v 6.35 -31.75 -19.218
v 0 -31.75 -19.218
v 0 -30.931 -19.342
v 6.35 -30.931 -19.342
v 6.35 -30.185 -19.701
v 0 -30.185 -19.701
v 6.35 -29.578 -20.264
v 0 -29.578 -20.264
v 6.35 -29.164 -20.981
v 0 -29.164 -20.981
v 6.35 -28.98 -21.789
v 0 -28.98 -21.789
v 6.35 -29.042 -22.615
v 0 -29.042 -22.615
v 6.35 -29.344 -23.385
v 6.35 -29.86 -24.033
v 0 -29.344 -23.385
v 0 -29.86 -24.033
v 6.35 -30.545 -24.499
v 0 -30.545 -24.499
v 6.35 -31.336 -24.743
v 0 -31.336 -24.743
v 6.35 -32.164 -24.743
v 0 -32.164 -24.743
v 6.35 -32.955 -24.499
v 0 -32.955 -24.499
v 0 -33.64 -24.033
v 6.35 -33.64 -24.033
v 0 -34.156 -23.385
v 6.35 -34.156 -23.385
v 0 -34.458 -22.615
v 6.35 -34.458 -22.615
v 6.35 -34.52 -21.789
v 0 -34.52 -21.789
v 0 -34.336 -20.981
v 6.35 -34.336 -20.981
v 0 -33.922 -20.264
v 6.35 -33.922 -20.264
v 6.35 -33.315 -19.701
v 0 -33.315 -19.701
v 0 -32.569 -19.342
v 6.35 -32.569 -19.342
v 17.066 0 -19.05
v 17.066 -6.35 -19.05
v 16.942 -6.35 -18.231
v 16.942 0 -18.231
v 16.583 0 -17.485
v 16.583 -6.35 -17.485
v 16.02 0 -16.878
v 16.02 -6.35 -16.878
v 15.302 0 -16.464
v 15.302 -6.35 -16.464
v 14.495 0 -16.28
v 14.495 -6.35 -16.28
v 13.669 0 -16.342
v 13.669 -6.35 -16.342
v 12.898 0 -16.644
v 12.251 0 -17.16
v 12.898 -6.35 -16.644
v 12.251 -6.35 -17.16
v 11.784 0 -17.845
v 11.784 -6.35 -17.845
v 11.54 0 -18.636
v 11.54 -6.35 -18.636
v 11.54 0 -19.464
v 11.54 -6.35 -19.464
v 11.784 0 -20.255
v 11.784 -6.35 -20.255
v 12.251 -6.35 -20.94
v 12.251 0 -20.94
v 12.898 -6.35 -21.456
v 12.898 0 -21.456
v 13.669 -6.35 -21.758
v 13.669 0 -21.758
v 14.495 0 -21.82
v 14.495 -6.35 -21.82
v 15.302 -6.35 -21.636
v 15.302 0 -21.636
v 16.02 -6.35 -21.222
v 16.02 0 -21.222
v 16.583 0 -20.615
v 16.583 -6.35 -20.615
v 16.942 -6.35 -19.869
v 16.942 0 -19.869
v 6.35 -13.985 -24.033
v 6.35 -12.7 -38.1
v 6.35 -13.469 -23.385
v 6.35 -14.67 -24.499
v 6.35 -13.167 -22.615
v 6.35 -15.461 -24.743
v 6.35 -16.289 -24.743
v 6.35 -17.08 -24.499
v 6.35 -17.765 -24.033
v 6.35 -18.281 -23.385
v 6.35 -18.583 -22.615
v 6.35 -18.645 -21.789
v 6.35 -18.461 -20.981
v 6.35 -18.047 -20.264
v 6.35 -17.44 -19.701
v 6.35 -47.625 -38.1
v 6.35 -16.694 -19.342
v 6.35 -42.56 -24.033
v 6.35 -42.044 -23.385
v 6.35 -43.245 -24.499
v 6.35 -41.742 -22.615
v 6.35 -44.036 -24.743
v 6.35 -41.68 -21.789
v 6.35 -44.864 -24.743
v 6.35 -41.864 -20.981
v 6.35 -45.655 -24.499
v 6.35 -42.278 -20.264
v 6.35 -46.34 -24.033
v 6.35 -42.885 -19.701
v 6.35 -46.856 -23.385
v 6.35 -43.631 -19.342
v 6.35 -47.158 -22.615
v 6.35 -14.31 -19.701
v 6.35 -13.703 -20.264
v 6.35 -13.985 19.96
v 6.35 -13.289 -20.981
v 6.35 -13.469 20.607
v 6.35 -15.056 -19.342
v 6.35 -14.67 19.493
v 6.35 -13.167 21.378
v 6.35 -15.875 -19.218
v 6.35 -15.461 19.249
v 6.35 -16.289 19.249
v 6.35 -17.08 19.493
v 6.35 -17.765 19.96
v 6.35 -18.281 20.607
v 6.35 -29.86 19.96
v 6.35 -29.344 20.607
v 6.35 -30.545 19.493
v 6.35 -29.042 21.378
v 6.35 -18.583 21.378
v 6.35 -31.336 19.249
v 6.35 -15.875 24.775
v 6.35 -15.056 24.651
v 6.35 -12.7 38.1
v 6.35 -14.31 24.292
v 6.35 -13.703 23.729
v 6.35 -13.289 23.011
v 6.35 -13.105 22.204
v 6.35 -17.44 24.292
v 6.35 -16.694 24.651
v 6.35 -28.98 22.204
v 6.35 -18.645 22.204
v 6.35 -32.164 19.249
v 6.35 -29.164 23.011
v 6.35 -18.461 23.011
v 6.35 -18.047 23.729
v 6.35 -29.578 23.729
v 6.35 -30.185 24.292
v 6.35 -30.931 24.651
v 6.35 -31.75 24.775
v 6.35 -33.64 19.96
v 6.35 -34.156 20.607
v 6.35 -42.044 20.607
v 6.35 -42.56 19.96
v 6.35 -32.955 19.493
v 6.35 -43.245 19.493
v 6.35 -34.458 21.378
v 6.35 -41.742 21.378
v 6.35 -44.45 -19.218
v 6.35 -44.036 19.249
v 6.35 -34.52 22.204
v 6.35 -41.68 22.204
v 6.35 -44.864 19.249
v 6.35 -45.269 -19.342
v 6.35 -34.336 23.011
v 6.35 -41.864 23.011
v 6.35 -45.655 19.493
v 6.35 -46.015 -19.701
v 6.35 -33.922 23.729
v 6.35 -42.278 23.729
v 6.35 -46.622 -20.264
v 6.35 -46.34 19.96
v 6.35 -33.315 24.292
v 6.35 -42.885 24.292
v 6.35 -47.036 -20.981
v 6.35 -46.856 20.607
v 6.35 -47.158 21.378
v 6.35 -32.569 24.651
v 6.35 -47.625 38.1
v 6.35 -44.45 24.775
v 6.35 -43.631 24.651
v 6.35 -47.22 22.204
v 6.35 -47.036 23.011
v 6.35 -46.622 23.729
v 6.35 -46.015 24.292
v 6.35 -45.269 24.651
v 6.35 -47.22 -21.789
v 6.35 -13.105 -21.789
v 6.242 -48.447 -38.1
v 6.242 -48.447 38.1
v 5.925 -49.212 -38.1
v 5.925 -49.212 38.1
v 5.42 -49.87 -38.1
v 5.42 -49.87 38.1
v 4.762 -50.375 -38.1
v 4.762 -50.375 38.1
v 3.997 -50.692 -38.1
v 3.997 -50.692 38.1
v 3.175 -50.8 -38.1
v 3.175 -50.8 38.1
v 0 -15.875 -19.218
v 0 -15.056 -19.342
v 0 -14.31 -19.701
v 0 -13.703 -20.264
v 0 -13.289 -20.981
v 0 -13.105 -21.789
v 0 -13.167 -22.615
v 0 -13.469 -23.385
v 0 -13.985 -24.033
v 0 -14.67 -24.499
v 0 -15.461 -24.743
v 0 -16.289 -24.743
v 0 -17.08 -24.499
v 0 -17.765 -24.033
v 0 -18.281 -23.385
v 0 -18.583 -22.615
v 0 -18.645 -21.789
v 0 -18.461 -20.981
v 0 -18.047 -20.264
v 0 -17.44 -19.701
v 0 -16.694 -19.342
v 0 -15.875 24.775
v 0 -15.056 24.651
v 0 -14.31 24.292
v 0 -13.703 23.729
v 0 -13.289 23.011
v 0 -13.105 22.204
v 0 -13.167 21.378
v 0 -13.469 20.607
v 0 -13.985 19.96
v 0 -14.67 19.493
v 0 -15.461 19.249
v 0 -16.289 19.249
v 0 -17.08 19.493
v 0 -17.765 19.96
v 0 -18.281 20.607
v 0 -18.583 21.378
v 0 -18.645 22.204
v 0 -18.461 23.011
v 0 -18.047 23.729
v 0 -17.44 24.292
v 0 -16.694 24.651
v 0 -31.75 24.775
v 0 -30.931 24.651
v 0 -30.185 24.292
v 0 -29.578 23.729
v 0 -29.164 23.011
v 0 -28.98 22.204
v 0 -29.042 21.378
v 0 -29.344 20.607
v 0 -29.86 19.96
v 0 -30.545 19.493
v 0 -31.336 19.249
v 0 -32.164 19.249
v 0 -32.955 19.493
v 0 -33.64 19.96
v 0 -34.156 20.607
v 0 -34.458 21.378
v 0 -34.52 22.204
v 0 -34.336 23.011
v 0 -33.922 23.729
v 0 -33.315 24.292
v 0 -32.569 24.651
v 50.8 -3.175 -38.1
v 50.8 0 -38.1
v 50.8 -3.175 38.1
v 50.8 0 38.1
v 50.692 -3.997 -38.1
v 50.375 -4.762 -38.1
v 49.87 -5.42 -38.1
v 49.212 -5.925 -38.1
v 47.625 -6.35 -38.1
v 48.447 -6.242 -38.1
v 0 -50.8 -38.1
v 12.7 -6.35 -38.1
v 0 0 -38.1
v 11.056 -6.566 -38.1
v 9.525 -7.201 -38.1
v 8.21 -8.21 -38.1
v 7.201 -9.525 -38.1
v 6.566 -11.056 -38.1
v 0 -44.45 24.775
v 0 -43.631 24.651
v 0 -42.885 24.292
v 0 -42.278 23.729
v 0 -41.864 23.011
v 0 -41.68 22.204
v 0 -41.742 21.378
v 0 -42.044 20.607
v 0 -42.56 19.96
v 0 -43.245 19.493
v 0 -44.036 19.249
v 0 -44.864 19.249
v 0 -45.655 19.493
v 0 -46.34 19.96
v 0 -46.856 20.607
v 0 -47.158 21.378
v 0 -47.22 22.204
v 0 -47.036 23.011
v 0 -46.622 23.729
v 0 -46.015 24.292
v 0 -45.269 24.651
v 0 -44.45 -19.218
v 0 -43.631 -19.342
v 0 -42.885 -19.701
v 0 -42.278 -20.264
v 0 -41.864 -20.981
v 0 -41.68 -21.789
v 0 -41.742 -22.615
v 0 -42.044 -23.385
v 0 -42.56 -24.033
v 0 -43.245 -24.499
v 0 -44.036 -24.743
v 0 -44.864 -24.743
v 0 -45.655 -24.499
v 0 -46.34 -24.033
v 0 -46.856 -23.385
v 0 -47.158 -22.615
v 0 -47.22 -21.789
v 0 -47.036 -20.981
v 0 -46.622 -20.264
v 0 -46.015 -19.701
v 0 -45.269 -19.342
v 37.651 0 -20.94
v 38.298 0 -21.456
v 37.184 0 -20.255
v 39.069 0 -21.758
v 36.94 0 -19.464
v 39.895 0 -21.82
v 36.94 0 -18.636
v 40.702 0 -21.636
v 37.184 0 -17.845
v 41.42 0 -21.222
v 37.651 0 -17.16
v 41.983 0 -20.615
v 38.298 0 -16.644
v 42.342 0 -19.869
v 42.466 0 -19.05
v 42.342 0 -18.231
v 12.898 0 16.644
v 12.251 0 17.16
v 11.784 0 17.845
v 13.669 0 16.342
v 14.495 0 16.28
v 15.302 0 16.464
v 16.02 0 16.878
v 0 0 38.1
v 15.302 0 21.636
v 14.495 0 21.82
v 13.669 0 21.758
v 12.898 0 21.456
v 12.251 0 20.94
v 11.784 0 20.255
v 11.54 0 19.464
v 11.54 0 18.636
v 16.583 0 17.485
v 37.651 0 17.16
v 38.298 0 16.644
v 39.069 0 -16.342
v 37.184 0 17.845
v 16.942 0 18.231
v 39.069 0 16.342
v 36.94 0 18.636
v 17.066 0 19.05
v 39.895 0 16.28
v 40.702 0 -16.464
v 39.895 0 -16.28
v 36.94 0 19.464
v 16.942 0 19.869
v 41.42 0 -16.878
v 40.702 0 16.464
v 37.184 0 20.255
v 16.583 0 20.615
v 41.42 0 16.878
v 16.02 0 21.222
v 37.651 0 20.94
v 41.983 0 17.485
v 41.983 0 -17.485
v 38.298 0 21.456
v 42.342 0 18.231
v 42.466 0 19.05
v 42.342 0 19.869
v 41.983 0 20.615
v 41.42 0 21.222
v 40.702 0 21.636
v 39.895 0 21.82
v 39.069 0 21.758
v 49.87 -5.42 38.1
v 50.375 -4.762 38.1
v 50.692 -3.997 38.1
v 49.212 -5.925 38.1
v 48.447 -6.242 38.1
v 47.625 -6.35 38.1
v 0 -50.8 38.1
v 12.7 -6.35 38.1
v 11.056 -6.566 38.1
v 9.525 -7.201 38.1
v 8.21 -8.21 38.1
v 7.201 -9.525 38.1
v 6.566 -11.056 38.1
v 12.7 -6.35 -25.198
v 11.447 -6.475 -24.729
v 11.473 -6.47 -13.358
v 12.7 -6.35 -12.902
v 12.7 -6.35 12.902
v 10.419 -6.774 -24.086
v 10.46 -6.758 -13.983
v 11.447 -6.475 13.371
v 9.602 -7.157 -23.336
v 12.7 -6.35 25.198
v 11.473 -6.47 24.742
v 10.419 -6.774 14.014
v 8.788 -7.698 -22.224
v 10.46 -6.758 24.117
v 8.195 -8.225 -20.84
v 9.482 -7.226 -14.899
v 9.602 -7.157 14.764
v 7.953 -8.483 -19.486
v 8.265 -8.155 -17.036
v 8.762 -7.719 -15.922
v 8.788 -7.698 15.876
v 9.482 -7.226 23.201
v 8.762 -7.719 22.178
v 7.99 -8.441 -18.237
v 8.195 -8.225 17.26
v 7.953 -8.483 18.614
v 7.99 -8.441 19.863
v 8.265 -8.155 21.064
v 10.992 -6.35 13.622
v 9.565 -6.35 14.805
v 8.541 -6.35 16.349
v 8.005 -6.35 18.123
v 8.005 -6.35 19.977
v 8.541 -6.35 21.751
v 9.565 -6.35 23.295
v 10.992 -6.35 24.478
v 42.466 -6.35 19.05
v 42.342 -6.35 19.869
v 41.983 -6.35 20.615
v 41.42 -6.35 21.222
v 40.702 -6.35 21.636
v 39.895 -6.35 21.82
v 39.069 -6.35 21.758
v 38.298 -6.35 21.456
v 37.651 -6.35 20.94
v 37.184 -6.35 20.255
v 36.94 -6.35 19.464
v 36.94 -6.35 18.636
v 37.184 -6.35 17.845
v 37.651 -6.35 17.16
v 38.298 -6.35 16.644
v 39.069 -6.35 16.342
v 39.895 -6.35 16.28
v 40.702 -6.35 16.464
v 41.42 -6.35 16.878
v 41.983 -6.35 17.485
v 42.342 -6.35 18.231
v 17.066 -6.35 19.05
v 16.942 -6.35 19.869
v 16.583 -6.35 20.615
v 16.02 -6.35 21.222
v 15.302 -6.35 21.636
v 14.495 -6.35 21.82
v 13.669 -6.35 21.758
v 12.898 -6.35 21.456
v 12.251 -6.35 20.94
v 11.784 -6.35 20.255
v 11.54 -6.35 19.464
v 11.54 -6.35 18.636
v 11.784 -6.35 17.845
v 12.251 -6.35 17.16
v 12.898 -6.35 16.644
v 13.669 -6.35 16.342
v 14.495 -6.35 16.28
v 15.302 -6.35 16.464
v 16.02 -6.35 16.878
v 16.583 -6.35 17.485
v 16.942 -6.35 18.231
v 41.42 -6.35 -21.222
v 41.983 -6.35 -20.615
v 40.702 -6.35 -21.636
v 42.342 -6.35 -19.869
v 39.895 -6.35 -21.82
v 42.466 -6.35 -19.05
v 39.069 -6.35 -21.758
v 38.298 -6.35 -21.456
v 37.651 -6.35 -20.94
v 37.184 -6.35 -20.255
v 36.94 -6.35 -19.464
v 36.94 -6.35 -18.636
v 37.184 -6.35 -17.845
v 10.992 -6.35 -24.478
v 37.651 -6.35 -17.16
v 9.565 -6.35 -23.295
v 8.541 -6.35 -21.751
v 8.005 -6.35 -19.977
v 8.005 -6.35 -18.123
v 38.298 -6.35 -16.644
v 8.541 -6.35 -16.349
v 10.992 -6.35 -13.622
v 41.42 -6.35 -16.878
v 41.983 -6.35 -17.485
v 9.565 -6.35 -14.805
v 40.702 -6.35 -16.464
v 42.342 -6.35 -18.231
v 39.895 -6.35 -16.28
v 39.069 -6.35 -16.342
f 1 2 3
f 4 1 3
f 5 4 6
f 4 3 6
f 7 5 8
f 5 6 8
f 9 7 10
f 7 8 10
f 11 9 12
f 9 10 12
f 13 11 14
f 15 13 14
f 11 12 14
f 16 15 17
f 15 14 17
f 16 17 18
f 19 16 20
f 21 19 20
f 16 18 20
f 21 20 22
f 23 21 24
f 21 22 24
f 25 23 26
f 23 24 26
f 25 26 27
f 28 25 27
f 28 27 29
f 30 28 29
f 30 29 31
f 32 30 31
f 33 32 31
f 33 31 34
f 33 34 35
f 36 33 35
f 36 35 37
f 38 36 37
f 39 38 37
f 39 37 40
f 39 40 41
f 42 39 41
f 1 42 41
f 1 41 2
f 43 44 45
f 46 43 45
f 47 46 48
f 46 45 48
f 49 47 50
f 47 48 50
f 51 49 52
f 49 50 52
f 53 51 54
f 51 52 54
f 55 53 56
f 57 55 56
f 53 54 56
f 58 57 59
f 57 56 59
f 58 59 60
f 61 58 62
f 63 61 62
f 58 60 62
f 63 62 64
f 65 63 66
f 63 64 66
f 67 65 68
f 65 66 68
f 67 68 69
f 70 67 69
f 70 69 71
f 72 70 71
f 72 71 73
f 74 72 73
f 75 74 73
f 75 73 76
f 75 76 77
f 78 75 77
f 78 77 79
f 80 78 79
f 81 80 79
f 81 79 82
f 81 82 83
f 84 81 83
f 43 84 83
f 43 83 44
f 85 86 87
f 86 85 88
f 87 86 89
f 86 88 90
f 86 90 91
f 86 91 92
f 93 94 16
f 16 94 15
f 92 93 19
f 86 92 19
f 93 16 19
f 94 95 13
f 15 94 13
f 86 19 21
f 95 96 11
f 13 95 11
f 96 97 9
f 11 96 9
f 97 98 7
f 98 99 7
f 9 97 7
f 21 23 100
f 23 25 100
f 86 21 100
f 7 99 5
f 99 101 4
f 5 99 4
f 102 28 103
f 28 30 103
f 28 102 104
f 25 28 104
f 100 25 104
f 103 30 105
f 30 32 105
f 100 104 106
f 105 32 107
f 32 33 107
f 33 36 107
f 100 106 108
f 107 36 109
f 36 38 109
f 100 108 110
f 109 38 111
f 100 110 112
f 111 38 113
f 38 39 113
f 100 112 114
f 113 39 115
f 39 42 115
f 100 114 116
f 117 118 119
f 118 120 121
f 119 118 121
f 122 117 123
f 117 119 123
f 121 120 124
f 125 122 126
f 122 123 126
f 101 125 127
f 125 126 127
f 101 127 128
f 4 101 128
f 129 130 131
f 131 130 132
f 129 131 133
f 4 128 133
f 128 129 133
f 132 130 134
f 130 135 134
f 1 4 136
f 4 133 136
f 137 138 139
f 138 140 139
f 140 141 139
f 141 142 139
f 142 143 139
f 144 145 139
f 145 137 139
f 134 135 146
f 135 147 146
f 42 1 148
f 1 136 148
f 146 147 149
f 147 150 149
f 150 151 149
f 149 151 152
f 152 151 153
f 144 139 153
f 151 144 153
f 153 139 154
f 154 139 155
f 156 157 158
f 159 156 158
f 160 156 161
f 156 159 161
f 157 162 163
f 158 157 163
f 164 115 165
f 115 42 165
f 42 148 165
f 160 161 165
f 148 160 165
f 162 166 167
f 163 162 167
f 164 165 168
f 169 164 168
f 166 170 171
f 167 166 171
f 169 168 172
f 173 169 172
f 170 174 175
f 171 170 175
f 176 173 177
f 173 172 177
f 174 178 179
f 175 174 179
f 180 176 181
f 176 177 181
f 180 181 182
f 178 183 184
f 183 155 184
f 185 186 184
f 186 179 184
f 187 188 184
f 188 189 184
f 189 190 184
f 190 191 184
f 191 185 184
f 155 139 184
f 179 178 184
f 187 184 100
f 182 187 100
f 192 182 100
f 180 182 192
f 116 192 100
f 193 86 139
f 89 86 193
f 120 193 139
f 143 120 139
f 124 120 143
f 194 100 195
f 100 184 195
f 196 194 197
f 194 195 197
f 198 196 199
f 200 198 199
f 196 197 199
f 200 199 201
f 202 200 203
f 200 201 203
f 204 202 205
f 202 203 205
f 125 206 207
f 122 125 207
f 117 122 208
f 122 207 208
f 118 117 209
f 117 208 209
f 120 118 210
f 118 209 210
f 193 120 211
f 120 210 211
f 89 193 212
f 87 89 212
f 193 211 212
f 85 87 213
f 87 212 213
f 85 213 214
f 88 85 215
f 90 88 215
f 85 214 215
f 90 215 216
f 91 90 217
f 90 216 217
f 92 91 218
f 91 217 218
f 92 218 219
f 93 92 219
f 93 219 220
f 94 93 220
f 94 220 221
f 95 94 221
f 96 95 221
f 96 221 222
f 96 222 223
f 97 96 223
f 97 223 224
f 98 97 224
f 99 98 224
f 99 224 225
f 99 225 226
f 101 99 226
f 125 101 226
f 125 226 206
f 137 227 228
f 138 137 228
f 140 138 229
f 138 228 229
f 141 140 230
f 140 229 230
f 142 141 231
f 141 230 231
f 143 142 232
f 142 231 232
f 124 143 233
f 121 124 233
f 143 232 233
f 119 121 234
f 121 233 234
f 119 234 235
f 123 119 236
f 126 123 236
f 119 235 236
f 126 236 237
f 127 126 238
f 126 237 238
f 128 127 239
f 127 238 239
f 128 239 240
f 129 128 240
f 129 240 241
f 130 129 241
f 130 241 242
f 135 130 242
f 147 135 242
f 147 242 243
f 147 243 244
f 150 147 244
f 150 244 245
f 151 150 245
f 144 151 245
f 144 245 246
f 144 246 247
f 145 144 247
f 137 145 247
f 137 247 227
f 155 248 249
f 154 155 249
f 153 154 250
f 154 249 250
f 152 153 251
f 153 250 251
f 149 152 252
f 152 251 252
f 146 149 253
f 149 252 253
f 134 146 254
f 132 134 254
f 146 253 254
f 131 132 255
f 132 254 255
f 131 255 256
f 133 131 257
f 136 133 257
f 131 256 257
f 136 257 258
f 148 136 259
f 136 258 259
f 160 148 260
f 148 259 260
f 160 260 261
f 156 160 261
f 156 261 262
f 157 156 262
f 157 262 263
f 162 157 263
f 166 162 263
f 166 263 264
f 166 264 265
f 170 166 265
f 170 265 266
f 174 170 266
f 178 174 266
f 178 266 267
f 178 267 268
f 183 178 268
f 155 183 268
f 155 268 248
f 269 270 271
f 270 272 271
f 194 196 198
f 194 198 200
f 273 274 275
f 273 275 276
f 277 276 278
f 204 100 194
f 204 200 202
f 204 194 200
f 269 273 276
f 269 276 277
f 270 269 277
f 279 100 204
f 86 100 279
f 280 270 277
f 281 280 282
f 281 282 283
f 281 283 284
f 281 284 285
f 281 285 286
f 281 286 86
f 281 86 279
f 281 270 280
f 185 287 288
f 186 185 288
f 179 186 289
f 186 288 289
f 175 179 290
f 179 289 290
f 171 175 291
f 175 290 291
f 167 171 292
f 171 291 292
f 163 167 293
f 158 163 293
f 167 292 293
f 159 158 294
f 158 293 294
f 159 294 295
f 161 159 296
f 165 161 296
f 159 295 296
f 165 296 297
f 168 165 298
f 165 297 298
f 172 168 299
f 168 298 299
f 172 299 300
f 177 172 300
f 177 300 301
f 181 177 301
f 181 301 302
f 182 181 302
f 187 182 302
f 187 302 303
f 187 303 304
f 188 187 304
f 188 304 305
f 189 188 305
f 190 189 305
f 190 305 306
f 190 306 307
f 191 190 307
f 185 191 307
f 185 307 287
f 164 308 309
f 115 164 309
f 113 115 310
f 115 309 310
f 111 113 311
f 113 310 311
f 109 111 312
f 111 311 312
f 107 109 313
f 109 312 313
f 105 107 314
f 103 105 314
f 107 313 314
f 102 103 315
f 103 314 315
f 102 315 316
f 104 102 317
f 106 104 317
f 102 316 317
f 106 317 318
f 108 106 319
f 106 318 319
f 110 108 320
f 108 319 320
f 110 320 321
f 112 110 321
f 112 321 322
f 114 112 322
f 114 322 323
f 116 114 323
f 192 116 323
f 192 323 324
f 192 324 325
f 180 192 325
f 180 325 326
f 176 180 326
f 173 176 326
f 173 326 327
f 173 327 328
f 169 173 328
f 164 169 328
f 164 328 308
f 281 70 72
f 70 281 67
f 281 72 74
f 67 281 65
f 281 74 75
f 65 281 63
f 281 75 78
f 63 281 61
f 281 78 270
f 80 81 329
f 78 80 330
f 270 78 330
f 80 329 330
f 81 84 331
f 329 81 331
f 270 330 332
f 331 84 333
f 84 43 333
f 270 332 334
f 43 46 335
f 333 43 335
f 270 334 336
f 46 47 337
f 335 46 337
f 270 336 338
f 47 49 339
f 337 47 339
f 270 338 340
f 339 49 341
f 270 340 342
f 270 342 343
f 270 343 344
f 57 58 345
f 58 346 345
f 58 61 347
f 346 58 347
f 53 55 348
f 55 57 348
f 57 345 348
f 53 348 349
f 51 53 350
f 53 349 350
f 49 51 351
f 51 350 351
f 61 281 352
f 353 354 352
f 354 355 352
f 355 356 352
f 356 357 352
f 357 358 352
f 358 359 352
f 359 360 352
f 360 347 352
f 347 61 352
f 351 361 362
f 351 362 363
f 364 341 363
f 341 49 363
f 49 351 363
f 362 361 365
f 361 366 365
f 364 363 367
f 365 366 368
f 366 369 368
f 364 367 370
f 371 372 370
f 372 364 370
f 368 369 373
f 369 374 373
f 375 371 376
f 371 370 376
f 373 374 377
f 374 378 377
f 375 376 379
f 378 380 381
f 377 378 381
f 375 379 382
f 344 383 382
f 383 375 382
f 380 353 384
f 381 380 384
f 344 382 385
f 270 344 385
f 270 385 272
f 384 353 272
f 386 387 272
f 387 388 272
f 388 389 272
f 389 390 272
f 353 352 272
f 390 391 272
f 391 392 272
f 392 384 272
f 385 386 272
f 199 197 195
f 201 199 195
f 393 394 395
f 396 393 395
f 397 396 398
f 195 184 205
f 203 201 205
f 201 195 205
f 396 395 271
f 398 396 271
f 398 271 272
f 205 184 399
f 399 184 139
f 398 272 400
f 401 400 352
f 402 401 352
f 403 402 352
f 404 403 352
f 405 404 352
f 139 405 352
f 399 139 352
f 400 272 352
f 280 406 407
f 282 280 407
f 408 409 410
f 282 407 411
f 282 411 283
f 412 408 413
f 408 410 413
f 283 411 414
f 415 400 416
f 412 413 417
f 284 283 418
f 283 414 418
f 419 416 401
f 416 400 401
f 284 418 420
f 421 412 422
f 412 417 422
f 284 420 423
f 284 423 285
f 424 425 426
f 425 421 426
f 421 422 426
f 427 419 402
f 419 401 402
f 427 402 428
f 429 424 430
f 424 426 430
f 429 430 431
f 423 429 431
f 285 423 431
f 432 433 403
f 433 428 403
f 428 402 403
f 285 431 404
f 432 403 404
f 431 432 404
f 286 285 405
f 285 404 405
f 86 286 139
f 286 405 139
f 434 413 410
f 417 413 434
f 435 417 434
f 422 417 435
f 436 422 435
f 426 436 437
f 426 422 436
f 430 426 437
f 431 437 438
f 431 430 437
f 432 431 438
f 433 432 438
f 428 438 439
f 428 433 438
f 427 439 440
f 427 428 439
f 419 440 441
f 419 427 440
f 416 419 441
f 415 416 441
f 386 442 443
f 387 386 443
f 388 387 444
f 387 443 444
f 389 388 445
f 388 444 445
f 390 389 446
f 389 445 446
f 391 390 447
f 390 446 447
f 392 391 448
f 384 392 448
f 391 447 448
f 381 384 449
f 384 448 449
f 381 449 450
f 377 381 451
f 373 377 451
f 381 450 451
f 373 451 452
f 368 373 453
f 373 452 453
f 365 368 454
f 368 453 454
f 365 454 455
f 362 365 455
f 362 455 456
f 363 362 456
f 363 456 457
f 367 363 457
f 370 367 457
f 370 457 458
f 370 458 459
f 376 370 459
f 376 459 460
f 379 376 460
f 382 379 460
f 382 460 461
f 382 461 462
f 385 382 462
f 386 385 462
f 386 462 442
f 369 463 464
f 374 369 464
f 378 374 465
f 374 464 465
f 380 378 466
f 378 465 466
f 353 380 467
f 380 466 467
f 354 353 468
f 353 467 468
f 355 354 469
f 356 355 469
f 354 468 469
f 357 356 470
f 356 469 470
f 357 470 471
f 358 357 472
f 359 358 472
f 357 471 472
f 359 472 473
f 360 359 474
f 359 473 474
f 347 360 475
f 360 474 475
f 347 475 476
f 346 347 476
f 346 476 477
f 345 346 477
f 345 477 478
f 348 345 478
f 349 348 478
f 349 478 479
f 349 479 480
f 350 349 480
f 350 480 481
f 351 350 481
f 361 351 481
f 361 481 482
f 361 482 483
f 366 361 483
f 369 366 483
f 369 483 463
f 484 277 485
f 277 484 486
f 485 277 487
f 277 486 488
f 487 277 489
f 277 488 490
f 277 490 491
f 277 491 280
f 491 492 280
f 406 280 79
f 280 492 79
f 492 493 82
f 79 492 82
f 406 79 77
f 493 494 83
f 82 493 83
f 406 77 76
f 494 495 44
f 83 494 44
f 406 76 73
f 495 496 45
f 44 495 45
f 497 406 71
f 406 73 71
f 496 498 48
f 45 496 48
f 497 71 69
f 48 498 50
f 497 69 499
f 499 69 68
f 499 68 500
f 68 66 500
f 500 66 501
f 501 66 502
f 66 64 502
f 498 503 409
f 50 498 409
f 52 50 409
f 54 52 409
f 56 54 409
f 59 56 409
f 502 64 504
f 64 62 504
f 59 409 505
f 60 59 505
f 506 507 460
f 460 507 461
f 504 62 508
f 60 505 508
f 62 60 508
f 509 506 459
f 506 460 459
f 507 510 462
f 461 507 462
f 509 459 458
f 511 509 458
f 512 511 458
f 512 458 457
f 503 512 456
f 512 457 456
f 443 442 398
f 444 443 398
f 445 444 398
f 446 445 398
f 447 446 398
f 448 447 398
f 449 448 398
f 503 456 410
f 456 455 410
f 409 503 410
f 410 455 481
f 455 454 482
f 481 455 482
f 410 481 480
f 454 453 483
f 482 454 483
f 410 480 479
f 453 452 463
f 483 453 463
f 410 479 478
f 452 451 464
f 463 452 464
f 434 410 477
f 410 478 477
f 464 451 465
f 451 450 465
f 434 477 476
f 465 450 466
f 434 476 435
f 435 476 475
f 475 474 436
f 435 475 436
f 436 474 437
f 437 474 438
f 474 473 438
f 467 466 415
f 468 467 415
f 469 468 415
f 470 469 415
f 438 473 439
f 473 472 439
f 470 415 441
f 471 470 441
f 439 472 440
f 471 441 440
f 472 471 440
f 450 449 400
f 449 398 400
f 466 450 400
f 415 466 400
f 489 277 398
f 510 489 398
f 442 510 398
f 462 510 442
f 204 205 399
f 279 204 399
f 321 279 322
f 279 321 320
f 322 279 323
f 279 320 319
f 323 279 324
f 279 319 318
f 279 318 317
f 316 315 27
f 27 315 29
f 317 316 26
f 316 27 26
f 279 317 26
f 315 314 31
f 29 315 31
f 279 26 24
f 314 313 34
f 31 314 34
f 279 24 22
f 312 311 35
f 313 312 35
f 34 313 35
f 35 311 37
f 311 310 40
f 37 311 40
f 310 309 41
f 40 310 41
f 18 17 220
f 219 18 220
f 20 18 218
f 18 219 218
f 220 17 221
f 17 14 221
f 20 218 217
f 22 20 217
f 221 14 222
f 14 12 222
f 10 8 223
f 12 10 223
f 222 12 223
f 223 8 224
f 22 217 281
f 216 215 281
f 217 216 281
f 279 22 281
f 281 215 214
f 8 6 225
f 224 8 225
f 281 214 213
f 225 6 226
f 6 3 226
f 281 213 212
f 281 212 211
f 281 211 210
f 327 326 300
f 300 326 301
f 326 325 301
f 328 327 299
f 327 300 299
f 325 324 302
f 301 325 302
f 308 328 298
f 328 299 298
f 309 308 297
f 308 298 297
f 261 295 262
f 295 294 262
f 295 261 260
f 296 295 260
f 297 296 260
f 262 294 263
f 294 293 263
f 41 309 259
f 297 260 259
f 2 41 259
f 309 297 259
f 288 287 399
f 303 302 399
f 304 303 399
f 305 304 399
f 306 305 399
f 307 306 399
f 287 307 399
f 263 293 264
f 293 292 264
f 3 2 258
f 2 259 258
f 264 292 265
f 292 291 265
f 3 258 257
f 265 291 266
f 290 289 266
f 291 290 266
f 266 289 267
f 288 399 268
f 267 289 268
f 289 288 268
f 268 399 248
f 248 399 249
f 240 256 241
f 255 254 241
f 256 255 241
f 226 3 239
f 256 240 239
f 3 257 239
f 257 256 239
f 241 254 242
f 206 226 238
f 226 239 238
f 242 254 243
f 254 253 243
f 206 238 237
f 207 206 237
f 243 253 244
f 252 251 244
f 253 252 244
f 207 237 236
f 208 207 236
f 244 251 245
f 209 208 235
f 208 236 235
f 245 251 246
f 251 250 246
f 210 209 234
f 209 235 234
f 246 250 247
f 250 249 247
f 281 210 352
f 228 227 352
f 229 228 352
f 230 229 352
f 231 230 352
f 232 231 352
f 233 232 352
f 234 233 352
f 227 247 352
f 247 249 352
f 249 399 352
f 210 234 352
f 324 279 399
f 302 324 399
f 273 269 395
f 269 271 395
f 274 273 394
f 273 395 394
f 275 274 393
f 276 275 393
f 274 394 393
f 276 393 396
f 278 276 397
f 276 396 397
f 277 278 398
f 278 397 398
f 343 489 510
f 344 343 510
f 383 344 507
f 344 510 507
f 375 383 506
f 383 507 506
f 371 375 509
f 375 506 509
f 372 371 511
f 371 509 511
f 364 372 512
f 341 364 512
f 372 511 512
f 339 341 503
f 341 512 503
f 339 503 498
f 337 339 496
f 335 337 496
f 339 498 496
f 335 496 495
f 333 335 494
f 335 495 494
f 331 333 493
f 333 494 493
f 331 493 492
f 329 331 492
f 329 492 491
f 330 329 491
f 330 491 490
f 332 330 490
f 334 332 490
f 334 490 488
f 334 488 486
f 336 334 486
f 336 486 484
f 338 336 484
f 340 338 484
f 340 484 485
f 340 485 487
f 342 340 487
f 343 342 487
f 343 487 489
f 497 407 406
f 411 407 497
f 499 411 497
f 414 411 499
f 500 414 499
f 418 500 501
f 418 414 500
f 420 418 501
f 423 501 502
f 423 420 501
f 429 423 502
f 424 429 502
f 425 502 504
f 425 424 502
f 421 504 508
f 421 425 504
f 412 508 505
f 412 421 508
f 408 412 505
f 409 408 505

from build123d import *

# Parameters (mm, degrees)
EXTRUDE1_DEPTH                  = 38.1
F_7_32_0_21875_DIAMETER_HOLE2_D = 5.55625
F_7_32_0_21875_DIAMETER_HOLE3_D = 5.55625
SKETCH6_R                       = 6.35
CUT_EXTRUDE1_DEPTH              = 9.525


with BuildPart() as part:
    # Sketch1 → Extrude1 (new body, symmetric)
    with BuildSketch(Plane.XY):
        with BuildLine():
            Line((0, 0), (50.8, 0))
            Line((50.8, 0), (50.8, -3.175))
            ThreePointArc((50.8, -3.175), (49.87006403, -5.42006403), (47.625, -6.35))
            Line((47.625, -6.35), (12.7, -6.35))
            ThreePointArc((12.7, -6.35), (8.209871939, -8.209871939), (6.35, -12.7))
            Line((6.35, -12.7), (6.35, -47.625))
            ThreePointArc((6.35, -47.625), (5.42006403, -49.87006403), (3.175, -50.8))
            Line((3.175, -50.8), (0, -50.8))
            Line((0, -50.8), (0, 0))
        make_face()
    extrude(amount=EXTRUDE1_DEPTH, both=True)

    # 7/32 (0.21875) Diameter Hole2 (through all)
    with Locations(Plane(origin=(-45.24375, 0, 38.1), x_dir=(-1, 0, 0), z_dir=(0, 1, 0))):
        with Locations((-84.93125, -19.05), (-84.93125, -57.15), (-59.53125, -57.15), (-59.53125, -19.05)):
            Hole(F_7_32_0_21875_DIAMETER_HOLE2_D / 2)

    # 7/32 (0.21875) Diameter Hole3 (through all)
    with Locations(Plane(origin=(6.35, 0, 0), x_dir=(0, 0, -1), z_dir=(1, 0, 0))):
        with Locations((-21.9964, -15.875), (21.9964, -15.875), (21.9964, -44.45), (-21.9964, -44.45), (-21.9964, -31.75), (21.9964, -31.75)):
            Hole(F_7_32_0_21875_DIAMETER_HOLE3_D / 2)

    # Sketch6 → Cut-Extrude1 (cut)
    with BuildSketch(Plane(origin=(0, -15.875, 0), x_dir=(-1, 0, 0), z_dir=(0, 1, 0))):
        with Locations((-14.2875, 19.05)):
            Circle(SKETCH6_R)
        with Locations((-14.2875, -19.05)):
            Circle(SKETCH6_R)
    extrude(amount=CUT_EXTRUDE1_DEPTH, mode=Mode.SUBTRACT)


solid = part.part
